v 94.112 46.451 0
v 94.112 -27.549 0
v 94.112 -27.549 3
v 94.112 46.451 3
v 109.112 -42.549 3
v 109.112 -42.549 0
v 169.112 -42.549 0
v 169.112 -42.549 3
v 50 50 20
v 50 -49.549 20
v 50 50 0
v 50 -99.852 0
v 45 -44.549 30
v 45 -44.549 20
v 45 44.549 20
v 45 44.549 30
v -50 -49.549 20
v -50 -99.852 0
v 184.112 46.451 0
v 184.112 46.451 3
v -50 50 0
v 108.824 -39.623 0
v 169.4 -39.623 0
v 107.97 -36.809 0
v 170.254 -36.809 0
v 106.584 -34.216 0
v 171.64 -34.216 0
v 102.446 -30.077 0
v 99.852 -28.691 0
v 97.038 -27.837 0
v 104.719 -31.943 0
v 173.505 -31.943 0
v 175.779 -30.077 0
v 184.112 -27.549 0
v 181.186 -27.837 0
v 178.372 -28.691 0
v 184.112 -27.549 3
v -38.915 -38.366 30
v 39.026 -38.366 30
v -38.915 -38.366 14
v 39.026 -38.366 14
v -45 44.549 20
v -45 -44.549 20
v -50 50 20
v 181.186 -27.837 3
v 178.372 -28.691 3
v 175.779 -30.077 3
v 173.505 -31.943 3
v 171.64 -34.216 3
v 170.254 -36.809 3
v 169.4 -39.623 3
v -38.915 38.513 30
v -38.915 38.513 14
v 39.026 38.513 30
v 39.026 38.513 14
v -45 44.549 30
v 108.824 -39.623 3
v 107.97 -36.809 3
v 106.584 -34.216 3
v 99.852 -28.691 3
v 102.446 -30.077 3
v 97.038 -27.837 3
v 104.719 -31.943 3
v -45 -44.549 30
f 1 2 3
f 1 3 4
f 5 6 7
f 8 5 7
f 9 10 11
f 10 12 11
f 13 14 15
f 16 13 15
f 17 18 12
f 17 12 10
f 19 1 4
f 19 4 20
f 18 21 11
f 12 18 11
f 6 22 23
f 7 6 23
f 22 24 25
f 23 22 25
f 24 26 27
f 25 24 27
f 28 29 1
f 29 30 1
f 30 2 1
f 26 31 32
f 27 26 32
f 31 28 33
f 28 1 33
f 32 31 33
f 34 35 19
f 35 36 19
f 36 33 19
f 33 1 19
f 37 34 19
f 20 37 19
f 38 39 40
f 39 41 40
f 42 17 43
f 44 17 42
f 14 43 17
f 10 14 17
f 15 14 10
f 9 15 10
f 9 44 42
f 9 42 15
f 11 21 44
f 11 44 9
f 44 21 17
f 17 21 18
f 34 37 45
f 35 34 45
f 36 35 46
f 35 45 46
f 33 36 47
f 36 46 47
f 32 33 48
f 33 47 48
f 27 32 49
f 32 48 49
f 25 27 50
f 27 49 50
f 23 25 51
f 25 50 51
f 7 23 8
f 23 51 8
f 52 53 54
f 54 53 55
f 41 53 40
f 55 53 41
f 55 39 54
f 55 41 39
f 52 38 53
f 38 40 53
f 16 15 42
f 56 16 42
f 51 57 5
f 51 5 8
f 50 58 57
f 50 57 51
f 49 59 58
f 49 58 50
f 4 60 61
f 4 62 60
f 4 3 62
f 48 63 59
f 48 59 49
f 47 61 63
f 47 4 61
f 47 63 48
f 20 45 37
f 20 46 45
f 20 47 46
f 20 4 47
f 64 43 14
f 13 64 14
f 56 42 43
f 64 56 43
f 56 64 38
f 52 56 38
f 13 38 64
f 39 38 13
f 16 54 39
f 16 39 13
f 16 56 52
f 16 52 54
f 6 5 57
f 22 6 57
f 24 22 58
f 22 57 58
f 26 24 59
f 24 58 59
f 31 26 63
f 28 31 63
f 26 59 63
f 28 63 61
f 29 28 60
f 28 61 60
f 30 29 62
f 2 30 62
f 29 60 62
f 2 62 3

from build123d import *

# Parameters (mm, degrees)
F0_W      = 100
F0_H      = 100
F0_H_2    = 49.8520702124
F1_DEPTH  = 20
F3_DEPTH  = 100.001
F4_W      = 6.0849060118
F4_H      = 6.1825428903
F4_W_2    = 77.9408477247
F4_H_2    = 76.879478991
F4_W_3    = 5.9742462635
F4_H_3    = 6.0356323421
F5_DEPTH  = 10
F6_DEPTH  = 6
F7_W      = 90
F7_H      = 89
F8_DEPTH  = 3
F10_DEPTH = 25


with BuildPart() as f1:
    # F0 (on Top) → F1 (new body)
    with BuildSketch(Plane.XY):
        Rectangle(F0_W, F0_H)
        with Locations((0, -74.9260351062)):
            Rectangle(F0_W, F0_H_2)
    extrude(amount=F1_DEPTH)

    # F2 (on face) → F3 (cut, through all)
    with BuildSketch(Plane.YZ.offset(50)):
        Polygon((-99.8520702124, 20), (-99.8520702124, 0), (-49.5488271117, 20), align=None)
    extrude(amount=-F3_DEPTH, mode=Mode.SUBTRACT)

    # F4 (on face) → F5 (join)
    with BuildSketch(Plane.XY.offset(20)):
        with Locations((-41.9575469941, -41.4575556666)):
            Rectangle(F4_W, F4_H)
        with Locations((0.0553298742, -41.4575556666)):
            Rectangle(F4_W_2, F4_H)
        with Locations((-41.9575469941, 0.0734552741)):
            Rectangle(F4_W, F4_H_2)
        with Locations((42.0128768682, -41.4575556666)):
            Rectangle(F4_W_3, F4_H)
        with Locations((-41.9575469941, 41.5310109407)):
            Rectangle(F4_W, F4_H_3)
        with Locations((0.0553298742, 41.5310109407)):
            Rectangle(F4_W_2, F4_H_3)
        with Locations((42.0128768682, 0.0734552741)):
            Rectangle(F4_W_3, F4_H_2)
        with Locations((42.0128768682, 41.5310109407)):
            Rectangle(F4_W_3, F4_H_3)
    extrude(amount=F5_DEPTH)

    # F6 (cut): a face of the model
    f6_faces = [f1.faces().sort_by_distance(p)[0] for p in [
        (0.0553298742, 0.0734552741, 20),
    ]]
    extrude(f6_faces, amount=-F6_DEPTH, mode=Mode.SUBTRACT)


with BuildPart() as f8:
    # F7 (on Top) → F8 (new body)
    with BuildSketch(Plane.XY):
        with Locations((139.1120888293, 1.9507788171)):
            Rectangle(F7_W, F7_H)
    extrude(amount=F8_DEPTH)

    # F9 (on face) → F10 (cut)
    with BuildSketch(Plane.XY.offset(3)):
        with BuildLine():
            Line((94.1120888293, -42.5492211829), (109.1120888293, -42.5492211829))
            ThreePointArc((109.1120888293, -42.5492211829), (104.7186905471, -31.9426194651), (94.1120888293, -27.5492211829))
            Line((94.1120888293, -27.5492211829), (94.1120888293, -42.5492211829))
        make_face()
        with BuildLine():
            ThreePointArc((184.1120888293, -27.5492211829), (173.5054871115, -31.9426194651), (169.1120888293, -42.5492211829))
            Line((169.1120888293, -42.5492211829), (184.1120888293, -42.5492211829))
            Line((184.1120888293, -42.5492211829), (184.1120888293, -27.5492211829))
        make_face()
    extrude(amount=-F10_DEPTH, mode=Mode.SUBTRACT)


solid = Compound([f1.part, f8.part])
